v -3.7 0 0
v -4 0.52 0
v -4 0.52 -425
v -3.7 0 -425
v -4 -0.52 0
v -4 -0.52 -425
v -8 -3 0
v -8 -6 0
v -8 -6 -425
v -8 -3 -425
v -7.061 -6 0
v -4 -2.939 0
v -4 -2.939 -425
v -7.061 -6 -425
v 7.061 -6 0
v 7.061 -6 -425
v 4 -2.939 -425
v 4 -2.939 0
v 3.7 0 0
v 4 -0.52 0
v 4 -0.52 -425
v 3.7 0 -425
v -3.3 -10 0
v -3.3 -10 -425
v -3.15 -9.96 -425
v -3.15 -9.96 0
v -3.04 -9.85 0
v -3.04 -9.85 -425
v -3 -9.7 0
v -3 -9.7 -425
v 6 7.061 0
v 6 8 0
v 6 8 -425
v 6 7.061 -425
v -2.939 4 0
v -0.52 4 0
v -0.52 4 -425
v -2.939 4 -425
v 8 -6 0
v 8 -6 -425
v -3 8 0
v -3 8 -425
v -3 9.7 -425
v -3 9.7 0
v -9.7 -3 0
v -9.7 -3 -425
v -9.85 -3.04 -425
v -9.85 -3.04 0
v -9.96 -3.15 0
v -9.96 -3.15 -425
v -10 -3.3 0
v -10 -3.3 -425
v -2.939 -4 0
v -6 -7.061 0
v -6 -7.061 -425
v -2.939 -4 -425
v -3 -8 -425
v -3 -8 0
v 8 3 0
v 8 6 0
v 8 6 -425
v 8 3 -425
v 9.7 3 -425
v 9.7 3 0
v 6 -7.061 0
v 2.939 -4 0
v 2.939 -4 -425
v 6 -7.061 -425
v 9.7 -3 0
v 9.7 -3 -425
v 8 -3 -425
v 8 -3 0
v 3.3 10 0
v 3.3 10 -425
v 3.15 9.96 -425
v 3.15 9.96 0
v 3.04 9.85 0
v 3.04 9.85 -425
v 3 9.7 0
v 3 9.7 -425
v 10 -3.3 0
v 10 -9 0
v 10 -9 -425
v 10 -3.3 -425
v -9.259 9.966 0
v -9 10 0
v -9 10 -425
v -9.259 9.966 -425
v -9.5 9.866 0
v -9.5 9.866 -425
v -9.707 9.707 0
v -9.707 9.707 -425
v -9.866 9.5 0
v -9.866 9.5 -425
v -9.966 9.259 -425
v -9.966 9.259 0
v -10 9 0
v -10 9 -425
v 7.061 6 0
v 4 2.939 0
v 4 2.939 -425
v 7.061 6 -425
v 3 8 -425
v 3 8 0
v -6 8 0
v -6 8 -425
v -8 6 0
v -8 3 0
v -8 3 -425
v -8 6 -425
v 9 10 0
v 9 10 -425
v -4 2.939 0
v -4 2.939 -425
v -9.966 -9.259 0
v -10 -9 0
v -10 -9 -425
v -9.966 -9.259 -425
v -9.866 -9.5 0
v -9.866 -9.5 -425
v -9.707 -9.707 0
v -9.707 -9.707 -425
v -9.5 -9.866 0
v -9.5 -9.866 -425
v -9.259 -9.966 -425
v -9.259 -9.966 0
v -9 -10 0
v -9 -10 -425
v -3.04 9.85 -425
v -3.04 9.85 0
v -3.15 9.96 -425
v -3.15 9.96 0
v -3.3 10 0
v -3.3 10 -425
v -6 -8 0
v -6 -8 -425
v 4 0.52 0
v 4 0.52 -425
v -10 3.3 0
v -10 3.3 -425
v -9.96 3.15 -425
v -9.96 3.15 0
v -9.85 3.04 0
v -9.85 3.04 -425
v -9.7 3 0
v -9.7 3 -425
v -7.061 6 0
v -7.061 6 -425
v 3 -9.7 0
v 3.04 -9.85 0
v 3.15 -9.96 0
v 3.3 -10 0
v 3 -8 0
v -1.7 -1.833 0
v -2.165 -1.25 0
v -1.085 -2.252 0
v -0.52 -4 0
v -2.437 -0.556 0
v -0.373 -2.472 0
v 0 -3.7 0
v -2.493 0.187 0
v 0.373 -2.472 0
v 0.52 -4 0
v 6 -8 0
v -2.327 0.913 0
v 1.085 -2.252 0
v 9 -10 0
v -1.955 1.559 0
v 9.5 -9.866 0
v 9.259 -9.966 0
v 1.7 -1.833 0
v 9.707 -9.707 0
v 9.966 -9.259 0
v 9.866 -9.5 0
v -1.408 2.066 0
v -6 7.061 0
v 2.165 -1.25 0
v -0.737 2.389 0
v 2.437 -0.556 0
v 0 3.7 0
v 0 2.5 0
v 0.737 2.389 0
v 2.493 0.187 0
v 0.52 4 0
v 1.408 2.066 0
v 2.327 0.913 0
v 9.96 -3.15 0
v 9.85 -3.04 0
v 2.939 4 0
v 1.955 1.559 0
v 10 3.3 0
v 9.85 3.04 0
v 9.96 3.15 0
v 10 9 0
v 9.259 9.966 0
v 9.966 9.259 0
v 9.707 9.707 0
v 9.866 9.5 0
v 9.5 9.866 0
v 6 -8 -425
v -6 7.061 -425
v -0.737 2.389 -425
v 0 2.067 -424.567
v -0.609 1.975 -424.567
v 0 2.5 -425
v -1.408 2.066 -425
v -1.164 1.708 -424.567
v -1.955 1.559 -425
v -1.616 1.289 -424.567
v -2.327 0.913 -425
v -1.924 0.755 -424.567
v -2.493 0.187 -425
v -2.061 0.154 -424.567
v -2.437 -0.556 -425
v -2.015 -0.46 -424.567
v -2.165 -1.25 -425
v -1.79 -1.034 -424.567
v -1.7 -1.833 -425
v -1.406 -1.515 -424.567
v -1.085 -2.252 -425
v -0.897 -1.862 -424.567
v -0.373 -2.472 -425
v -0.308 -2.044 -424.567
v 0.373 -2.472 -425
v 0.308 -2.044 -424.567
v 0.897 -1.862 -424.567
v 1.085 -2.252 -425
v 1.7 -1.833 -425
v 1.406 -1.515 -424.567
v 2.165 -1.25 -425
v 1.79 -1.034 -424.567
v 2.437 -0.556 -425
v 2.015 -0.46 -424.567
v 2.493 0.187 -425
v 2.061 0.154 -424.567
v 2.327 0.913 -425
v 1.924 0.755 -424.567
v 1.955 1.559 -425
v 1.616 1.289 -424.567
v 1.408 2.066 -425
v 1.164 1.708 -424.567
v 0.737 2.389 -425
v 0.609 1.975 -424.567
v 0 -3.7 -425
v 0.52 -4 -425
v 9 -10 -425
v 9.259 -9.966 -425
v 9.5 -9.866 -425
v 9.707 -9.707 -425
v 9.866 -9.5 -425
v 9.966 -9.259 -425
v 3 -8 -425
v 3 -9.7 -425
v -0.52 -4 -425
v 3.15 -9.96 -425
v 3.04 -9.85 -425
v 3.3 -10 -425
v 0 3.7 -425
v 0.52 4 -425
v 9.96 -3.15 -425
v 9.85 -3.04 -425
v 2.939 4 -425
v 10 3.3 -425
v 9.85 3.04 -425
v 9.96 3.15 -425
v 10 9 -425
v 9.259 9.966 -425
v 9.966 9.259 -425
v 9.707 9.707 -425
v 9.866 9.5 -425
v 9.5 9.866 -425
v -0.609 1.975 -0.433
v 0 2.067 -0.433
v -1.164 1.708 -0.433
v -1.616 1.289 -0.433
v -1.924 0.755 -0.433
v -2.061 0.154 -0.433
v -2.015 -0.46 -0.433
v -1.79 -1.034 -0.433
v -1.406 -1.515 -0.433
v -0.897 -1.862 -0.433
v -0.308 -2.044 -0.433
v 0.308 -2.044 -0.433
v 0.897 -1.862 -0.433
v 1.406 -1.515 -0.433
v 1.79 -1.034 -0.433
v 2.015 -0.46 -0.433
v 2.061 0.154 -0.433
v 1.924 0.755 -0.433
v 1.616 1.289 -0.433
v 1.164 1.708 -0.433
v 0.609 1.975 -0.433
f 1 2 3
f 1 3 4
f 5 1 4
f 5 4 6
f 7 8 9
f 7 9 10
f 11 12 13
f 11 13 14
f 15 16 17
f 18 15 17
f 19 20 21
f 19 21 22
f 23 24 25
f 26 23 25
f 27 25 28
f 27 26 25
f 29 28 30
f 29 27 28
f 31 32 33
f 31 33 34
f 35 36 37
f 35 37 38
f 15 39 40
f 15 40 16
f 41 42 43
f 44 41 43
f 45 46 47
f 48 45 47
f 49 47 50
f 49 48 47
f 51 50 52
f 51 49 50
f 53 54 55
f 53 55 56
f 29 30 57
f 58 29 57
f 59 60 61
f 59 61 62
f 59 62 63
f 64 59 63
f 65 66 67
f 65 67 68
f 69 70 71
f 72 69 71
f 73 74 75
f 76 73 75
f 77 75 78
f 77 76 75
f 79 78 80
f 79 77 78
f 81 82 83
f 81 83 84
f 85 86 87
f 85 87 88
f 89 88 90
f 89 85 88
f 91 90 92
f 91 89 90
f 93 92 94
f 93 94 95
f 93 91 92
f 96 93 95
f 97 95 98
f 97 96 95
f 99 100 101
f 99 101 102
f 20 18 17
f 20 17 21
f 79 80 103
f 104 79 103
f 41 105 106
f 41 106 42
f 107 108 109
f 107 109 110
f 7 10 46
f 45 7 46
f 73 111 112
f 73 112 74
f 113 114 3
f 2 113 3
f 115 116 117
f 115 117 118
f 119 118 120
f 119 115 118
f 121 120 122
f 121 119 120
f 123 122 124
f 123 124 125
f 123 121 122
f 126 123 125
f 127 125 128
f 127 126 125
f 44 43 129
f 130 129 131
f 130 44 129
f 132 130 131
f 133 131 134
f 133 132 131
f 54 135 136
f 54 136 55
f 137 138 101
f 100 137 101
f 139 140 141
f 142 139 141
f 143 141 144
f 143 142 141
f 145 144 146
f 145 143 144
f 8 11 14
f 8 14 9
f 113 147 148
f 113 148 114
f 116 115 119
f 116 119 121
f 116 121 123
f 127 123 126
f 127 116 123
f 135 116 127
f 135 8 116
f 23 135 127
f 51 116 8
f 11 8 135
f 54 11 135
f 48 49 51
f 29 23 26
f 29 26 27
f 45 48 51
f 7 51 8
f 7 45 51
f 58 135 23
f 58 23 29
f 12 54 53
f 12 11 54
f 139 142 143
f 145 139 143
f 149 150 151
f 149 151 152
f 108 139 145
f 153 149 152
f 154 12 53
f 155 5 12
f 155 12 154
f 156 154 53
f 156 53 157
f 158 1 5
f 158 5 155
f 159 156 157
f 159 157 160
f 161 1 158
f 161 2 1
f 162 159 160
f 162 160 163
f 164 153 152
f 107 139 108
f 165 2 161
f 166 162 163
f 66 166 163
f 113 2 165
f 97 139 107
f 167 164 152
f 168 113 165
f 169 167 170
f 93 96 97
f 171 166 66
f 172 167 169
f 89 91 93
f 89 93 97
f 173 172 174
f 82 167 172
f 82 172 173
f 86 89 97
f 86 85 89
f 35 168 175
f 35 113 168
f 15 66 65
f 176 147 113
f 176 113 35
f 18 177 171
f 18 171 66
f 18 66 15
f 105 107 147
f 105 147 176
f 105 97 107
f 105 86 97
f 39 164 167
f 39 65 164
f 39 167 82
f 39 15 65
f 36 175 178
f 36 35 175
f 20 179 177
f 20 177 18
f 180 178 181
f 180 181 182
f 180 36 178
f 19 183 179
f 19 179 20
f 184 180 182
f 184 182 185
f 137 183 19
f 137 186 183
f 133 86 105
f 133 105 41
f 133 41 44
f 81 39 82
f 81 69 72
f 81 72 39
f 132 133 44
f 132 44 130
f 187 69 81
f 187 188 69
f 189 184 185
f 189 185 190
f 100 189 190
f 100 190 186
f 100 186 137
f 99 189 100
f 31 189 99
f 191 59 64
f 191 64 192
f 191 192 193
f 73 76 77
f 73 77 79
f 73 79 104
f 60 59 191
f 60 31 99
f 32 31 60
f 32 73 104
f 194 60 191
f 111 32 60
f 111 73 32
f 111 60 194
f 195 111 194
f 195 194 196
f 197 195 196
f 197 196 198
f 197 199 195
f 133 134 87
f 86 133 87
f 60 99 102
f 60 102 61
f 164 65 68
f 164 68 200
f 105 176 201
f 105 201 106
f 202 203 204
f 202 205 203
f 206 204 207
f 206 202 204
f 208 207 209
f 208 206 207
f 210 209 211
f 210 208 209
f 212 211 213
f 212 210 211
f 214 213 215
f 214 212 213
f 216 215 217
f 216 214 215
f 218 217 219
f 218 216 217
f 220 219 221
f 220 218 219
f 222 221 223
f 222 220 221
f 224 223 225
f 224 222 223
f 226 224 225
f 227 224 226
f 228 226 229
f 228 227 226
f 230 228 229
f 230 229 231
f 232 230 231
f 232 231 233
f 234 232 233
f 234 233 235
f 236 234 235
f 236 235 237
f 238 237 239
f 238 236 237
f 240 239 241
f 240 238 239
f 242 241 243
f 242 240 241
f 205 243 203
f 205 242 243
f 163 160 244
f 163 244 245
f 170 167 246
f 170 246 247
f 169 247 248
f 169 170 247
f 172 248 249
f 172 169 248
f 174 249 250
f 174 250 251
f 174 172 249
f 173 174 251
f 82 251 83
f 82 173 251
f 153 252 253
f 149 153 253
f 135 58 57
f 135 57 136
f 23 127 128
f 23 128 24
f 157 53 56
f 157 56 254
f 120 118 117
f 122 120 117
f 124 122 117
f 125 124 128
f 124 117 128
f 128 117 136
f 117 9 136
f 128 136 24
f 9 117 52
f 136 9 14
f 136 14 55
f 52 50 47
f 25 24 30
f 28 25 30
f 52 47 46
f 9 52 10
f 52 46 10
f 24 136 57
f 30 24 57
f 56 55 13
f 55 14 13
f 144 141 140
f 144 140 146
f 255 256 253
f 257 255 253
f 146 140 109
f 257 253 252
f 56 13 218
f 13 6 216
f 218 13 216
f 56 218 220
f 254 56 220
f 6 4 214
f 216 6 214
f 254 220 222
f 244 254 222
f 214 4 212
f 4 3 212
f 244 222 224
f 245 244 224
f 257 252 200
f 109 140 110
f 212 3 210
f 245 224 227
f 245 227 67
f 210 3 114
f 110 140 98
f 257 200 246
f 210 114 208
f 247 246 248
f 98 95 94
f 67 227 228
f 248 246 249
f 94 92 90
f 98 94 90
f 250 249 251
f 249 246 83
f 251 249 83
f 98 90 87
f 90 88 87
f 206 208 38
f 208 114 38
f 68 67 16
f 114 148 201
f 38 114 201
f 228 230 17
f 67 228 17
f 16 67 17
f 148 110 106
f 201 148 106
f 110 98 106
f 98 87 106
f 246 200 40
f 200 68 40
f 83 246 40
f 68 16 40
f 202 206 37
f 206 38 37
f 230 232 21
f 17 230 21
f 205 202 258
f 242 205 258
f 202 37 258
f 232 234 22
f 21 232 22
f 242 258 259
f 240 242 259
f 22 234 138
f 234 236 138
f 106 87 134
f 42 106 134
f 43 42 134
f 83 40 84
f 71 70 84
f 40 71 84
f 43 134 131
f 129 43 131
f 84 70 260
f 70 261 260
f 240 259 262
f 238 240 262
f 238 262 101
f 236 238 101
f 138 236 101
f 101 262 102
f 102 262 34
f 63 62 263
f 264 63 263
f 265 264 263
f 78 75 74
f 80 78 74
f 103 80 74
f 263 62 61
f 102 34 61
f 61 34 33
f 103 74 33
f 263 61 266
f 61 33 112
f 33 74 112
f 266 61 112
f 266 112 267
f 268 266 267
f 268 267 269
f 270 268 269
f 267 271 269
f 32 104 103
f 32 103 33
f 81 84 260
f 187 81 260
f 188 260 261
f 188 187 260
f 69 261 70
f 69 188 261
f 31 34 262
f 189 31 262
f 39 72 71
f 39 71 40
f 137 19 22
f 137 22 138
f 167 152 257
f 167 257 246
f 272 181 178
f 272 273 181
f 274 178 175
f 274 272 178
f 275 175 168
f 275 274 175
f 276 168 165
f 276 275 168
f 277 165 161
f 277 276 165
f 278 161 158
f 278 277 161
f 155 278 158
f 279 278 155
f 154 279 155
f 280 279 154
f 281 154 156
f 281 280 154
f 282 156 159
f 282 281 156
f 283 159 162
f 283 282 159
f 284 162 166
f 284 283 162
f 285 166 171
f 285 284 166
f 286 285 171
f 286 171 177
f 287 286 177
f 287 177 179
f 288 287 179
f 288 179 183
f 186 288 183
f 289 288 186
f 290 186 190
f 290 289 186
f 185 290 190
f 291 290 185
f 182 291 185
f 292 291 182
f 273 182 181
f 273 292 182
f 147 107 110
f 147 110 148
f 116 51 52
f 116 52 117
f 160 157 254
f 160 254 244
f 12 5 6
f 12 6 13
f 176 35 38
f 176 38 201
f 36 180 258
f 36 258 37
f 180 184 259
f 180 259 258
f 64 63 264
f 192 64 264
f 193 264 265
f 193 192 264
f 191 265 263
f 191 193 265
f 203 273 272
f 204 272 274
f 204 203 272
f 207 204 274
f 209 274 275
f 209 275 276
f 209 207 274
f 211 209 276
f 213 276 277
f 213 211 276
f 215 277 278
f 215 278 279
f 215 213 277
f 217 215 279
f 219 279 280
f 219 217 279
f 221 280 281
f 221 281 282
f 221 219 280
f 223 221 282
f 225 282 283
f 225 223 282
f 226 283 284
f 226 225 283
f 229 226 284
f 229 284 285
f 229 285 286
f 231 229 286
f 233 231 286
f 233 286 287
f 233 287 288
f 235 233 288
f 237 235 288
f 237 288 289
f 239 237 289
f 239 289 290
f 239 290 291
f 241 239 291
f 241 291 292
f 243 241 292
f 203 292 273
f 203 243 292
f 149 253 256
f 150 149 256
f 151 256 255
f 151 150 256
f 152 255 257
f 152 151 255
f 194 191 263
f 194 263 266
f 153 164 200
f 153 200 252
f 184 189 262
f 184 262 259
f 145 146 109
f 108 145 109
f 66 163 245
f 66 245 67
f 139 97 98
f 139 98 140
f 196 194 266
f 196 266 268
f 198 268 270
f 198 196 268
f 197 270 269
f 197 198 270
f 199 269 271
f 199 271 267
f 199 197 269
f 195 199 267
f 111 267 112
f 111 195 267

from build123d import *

# Parameters (mm, degrees)
BOSS_EXTRUDE1_DEPTH = 425


with BuildPart() as part:
    # Sketch1 → Boss-Extrude1 (new body)
    with BuildSketch(Plane.XY):
        with BuildLine():
            Line((-10, 9), (-10, 3.29999995))
            ThreePointArc((-10, 3.29999995), (-9.912132049, 3.087867916), (-9.7, 3))
            Line((-9.7, 3), (-8, 3))
            Line((-8, 3), (-8, 6))
            Line((-8, 6), (-7.060677, 6))
            Line((-7.060677, 6), (-4, 2.93932965))
            Line((-4, 2.93932965), (-4, 0.519615242))
            Line((-4, 0.519615242), (-3.699996283, -6.437e-06))
            Line((-3.699996283, -6.437e-06), (-4, -0.519628117))
            Line((-4, -0.519628117), (-4, -2.93933725))
            Line((-4, -2.93933725), (-7.0606695, -6))
            Line((-7.0606695, -6), (-8, -6))
            Line((-8, -6), (-8, -3))
            Line((-8, -3), (-9.7, -3))
            ThreePointArc((-9.7, -3), (-9.912132049, -3.087867916), (-10, -3.29999995))
            Line((-10, -3.29999995), (-10, -9))
            ThreePointArc((-10, -9), (-9.707106781, -9.707106781), (-9, -10))
            Line((-9, -10), (-3.29999995, -10))
            ThreePointArc((-3.29999995, -10), (-3.087867916, -9.912132049), (-3, -9.7))
            Line((-3, -9.7), (-3, -8))
            Line((-3, -8), (-6, -8))
            Line((-6, -8), (-6, -7.0606515))
            Line((-6, -7.0606515), (-2.9393489, -4))
            Line((-2.9393489, -4), (-0.519615242, -4))
            Line((-0.519615242, -4), (6.437e-06, -3.699996283))
            Line((6.437e-06, -3.699996283), (0.519628117, -4))
            Line((0.519628117, -4), (2.9393227, -4))
            Line((2.9393227, -4), (6, -7.060677))
            Line((6, -7.060677), (6, -8))
            Line((6, -8), (3, -8))
            Line((3, -8), (3, -9.7))
            ThreePointArc((3, -9.7), (3.087867916, -9.912132049), (3.29999995, -10))
            Line((3.29999995, -10), (9, -10))
            ThreePointArc((9, -10), (9.707106781, -9.707106781), (10, -9))
            Line((10, -9), (10, -3.29999995))
            ThreePointArc((10, -3.29999995), (9.912132049, -3.087867916), (9.7, -3))
            Line((9.7, -3), (8, -3))
            Line((8, -3), (8, -6))
            Line((8, -6), (7.0606435, -6))
            Line((7.0606435, -6), (4, -2.9393482))
            Line((4, -2.9393482), (4, -0.519615242))
            Line((4, -0.519615242), (3.699996283, 6.437e-06))
            Line((3.699996283, 6.437e-06), (4, 0.519628117))
            Line((4, 0.519628117), (4, 2.9393401))
            Line((4, 2.9393401), (7.060651, 6))
            Line((7.060651, 6), (8, 6))
            Line((8, 6), (8, 3))
            Line((8, 3), (9.7, 3))
            ThreePointArc((9.7, 3), (9.912132049, 3.087867916), (10, 3.29999995))
            Line((10, 3.29999995), (10, 9))
            ThreePointArc((10, 9), (9.707106781, 9.707106781), (9, 10))
            Line((9, 10), (3.29999995, 10))
            ThreePointArc((3.29999995, 10), (3.087867916, 9.912132049), (3, 9.7))
            Line((3, 9.7), (3, 8))
            Line((3, 8), (6, 8))
            Line((6, 8), (6, 7.060669))
            Line((6, 7.060669), (2.9393308, 4))
            Line((2.9393308, 4), (0.519615242, 4))
            Line((0.519615242, 4), (-6.437e-06, 3.699996283))
            Line((-6.437e-06, 3.699996283), (-0.519628117, 4))
            Line((-0.519628117, 4), (-2.93935655, 4))
            Line((-2.93935655, 4), (-6, 7.0606435))
            Line((-6, 7.0606435), (-6, 8))
            Line((-6, 8), (-3, 8))
            Line((-3, 8), (-3, 9.7))
            ThreePointArc((-3, 9.7), (-3.087867966, 9.912132034), (-3.3, 10))
            Line((-3.3, 10), (-9, 10))
            ThreePointArc((-9, 10), (-9.707106781, 9.707106781), (-10, 9))
        make_face()
    extrude(amount=-BOSS_EXTRUDE1_DEPTH)

    # Sketch2 → Cut-Revolve1 (revolve, cut)
    with BuildSketch(Plane(origin=(0, 0, 0), x_dir=(0, 0, -1), z_dir=(1, 0, 0))):
        Polygon((0, 0), (0, 2.5), (0.433, 2.067), (425, 2.067), (425, 0), align=None)
    revolve(axis=Axis((0, 0, -425), (0, 0, 1)), mode=Mode.SUBTRACT)

    # Sketch3 → Cut-Revolve2 (revolve, cut)
    with BuildSketch(Plane(origin=(0, 0, 0), x_dir=(0, 0, -1), z_dir=(1, 0, 0))):
        Polygon((0, 0), (0, 2.067), (424.567, 2.067), (425, 2.5), (425, 0), align=None)
    revolve(axis=Axis((0, 0, -425), (0, 0, 1)), mode=Mode.SUBTRACT)


solid = part.part
